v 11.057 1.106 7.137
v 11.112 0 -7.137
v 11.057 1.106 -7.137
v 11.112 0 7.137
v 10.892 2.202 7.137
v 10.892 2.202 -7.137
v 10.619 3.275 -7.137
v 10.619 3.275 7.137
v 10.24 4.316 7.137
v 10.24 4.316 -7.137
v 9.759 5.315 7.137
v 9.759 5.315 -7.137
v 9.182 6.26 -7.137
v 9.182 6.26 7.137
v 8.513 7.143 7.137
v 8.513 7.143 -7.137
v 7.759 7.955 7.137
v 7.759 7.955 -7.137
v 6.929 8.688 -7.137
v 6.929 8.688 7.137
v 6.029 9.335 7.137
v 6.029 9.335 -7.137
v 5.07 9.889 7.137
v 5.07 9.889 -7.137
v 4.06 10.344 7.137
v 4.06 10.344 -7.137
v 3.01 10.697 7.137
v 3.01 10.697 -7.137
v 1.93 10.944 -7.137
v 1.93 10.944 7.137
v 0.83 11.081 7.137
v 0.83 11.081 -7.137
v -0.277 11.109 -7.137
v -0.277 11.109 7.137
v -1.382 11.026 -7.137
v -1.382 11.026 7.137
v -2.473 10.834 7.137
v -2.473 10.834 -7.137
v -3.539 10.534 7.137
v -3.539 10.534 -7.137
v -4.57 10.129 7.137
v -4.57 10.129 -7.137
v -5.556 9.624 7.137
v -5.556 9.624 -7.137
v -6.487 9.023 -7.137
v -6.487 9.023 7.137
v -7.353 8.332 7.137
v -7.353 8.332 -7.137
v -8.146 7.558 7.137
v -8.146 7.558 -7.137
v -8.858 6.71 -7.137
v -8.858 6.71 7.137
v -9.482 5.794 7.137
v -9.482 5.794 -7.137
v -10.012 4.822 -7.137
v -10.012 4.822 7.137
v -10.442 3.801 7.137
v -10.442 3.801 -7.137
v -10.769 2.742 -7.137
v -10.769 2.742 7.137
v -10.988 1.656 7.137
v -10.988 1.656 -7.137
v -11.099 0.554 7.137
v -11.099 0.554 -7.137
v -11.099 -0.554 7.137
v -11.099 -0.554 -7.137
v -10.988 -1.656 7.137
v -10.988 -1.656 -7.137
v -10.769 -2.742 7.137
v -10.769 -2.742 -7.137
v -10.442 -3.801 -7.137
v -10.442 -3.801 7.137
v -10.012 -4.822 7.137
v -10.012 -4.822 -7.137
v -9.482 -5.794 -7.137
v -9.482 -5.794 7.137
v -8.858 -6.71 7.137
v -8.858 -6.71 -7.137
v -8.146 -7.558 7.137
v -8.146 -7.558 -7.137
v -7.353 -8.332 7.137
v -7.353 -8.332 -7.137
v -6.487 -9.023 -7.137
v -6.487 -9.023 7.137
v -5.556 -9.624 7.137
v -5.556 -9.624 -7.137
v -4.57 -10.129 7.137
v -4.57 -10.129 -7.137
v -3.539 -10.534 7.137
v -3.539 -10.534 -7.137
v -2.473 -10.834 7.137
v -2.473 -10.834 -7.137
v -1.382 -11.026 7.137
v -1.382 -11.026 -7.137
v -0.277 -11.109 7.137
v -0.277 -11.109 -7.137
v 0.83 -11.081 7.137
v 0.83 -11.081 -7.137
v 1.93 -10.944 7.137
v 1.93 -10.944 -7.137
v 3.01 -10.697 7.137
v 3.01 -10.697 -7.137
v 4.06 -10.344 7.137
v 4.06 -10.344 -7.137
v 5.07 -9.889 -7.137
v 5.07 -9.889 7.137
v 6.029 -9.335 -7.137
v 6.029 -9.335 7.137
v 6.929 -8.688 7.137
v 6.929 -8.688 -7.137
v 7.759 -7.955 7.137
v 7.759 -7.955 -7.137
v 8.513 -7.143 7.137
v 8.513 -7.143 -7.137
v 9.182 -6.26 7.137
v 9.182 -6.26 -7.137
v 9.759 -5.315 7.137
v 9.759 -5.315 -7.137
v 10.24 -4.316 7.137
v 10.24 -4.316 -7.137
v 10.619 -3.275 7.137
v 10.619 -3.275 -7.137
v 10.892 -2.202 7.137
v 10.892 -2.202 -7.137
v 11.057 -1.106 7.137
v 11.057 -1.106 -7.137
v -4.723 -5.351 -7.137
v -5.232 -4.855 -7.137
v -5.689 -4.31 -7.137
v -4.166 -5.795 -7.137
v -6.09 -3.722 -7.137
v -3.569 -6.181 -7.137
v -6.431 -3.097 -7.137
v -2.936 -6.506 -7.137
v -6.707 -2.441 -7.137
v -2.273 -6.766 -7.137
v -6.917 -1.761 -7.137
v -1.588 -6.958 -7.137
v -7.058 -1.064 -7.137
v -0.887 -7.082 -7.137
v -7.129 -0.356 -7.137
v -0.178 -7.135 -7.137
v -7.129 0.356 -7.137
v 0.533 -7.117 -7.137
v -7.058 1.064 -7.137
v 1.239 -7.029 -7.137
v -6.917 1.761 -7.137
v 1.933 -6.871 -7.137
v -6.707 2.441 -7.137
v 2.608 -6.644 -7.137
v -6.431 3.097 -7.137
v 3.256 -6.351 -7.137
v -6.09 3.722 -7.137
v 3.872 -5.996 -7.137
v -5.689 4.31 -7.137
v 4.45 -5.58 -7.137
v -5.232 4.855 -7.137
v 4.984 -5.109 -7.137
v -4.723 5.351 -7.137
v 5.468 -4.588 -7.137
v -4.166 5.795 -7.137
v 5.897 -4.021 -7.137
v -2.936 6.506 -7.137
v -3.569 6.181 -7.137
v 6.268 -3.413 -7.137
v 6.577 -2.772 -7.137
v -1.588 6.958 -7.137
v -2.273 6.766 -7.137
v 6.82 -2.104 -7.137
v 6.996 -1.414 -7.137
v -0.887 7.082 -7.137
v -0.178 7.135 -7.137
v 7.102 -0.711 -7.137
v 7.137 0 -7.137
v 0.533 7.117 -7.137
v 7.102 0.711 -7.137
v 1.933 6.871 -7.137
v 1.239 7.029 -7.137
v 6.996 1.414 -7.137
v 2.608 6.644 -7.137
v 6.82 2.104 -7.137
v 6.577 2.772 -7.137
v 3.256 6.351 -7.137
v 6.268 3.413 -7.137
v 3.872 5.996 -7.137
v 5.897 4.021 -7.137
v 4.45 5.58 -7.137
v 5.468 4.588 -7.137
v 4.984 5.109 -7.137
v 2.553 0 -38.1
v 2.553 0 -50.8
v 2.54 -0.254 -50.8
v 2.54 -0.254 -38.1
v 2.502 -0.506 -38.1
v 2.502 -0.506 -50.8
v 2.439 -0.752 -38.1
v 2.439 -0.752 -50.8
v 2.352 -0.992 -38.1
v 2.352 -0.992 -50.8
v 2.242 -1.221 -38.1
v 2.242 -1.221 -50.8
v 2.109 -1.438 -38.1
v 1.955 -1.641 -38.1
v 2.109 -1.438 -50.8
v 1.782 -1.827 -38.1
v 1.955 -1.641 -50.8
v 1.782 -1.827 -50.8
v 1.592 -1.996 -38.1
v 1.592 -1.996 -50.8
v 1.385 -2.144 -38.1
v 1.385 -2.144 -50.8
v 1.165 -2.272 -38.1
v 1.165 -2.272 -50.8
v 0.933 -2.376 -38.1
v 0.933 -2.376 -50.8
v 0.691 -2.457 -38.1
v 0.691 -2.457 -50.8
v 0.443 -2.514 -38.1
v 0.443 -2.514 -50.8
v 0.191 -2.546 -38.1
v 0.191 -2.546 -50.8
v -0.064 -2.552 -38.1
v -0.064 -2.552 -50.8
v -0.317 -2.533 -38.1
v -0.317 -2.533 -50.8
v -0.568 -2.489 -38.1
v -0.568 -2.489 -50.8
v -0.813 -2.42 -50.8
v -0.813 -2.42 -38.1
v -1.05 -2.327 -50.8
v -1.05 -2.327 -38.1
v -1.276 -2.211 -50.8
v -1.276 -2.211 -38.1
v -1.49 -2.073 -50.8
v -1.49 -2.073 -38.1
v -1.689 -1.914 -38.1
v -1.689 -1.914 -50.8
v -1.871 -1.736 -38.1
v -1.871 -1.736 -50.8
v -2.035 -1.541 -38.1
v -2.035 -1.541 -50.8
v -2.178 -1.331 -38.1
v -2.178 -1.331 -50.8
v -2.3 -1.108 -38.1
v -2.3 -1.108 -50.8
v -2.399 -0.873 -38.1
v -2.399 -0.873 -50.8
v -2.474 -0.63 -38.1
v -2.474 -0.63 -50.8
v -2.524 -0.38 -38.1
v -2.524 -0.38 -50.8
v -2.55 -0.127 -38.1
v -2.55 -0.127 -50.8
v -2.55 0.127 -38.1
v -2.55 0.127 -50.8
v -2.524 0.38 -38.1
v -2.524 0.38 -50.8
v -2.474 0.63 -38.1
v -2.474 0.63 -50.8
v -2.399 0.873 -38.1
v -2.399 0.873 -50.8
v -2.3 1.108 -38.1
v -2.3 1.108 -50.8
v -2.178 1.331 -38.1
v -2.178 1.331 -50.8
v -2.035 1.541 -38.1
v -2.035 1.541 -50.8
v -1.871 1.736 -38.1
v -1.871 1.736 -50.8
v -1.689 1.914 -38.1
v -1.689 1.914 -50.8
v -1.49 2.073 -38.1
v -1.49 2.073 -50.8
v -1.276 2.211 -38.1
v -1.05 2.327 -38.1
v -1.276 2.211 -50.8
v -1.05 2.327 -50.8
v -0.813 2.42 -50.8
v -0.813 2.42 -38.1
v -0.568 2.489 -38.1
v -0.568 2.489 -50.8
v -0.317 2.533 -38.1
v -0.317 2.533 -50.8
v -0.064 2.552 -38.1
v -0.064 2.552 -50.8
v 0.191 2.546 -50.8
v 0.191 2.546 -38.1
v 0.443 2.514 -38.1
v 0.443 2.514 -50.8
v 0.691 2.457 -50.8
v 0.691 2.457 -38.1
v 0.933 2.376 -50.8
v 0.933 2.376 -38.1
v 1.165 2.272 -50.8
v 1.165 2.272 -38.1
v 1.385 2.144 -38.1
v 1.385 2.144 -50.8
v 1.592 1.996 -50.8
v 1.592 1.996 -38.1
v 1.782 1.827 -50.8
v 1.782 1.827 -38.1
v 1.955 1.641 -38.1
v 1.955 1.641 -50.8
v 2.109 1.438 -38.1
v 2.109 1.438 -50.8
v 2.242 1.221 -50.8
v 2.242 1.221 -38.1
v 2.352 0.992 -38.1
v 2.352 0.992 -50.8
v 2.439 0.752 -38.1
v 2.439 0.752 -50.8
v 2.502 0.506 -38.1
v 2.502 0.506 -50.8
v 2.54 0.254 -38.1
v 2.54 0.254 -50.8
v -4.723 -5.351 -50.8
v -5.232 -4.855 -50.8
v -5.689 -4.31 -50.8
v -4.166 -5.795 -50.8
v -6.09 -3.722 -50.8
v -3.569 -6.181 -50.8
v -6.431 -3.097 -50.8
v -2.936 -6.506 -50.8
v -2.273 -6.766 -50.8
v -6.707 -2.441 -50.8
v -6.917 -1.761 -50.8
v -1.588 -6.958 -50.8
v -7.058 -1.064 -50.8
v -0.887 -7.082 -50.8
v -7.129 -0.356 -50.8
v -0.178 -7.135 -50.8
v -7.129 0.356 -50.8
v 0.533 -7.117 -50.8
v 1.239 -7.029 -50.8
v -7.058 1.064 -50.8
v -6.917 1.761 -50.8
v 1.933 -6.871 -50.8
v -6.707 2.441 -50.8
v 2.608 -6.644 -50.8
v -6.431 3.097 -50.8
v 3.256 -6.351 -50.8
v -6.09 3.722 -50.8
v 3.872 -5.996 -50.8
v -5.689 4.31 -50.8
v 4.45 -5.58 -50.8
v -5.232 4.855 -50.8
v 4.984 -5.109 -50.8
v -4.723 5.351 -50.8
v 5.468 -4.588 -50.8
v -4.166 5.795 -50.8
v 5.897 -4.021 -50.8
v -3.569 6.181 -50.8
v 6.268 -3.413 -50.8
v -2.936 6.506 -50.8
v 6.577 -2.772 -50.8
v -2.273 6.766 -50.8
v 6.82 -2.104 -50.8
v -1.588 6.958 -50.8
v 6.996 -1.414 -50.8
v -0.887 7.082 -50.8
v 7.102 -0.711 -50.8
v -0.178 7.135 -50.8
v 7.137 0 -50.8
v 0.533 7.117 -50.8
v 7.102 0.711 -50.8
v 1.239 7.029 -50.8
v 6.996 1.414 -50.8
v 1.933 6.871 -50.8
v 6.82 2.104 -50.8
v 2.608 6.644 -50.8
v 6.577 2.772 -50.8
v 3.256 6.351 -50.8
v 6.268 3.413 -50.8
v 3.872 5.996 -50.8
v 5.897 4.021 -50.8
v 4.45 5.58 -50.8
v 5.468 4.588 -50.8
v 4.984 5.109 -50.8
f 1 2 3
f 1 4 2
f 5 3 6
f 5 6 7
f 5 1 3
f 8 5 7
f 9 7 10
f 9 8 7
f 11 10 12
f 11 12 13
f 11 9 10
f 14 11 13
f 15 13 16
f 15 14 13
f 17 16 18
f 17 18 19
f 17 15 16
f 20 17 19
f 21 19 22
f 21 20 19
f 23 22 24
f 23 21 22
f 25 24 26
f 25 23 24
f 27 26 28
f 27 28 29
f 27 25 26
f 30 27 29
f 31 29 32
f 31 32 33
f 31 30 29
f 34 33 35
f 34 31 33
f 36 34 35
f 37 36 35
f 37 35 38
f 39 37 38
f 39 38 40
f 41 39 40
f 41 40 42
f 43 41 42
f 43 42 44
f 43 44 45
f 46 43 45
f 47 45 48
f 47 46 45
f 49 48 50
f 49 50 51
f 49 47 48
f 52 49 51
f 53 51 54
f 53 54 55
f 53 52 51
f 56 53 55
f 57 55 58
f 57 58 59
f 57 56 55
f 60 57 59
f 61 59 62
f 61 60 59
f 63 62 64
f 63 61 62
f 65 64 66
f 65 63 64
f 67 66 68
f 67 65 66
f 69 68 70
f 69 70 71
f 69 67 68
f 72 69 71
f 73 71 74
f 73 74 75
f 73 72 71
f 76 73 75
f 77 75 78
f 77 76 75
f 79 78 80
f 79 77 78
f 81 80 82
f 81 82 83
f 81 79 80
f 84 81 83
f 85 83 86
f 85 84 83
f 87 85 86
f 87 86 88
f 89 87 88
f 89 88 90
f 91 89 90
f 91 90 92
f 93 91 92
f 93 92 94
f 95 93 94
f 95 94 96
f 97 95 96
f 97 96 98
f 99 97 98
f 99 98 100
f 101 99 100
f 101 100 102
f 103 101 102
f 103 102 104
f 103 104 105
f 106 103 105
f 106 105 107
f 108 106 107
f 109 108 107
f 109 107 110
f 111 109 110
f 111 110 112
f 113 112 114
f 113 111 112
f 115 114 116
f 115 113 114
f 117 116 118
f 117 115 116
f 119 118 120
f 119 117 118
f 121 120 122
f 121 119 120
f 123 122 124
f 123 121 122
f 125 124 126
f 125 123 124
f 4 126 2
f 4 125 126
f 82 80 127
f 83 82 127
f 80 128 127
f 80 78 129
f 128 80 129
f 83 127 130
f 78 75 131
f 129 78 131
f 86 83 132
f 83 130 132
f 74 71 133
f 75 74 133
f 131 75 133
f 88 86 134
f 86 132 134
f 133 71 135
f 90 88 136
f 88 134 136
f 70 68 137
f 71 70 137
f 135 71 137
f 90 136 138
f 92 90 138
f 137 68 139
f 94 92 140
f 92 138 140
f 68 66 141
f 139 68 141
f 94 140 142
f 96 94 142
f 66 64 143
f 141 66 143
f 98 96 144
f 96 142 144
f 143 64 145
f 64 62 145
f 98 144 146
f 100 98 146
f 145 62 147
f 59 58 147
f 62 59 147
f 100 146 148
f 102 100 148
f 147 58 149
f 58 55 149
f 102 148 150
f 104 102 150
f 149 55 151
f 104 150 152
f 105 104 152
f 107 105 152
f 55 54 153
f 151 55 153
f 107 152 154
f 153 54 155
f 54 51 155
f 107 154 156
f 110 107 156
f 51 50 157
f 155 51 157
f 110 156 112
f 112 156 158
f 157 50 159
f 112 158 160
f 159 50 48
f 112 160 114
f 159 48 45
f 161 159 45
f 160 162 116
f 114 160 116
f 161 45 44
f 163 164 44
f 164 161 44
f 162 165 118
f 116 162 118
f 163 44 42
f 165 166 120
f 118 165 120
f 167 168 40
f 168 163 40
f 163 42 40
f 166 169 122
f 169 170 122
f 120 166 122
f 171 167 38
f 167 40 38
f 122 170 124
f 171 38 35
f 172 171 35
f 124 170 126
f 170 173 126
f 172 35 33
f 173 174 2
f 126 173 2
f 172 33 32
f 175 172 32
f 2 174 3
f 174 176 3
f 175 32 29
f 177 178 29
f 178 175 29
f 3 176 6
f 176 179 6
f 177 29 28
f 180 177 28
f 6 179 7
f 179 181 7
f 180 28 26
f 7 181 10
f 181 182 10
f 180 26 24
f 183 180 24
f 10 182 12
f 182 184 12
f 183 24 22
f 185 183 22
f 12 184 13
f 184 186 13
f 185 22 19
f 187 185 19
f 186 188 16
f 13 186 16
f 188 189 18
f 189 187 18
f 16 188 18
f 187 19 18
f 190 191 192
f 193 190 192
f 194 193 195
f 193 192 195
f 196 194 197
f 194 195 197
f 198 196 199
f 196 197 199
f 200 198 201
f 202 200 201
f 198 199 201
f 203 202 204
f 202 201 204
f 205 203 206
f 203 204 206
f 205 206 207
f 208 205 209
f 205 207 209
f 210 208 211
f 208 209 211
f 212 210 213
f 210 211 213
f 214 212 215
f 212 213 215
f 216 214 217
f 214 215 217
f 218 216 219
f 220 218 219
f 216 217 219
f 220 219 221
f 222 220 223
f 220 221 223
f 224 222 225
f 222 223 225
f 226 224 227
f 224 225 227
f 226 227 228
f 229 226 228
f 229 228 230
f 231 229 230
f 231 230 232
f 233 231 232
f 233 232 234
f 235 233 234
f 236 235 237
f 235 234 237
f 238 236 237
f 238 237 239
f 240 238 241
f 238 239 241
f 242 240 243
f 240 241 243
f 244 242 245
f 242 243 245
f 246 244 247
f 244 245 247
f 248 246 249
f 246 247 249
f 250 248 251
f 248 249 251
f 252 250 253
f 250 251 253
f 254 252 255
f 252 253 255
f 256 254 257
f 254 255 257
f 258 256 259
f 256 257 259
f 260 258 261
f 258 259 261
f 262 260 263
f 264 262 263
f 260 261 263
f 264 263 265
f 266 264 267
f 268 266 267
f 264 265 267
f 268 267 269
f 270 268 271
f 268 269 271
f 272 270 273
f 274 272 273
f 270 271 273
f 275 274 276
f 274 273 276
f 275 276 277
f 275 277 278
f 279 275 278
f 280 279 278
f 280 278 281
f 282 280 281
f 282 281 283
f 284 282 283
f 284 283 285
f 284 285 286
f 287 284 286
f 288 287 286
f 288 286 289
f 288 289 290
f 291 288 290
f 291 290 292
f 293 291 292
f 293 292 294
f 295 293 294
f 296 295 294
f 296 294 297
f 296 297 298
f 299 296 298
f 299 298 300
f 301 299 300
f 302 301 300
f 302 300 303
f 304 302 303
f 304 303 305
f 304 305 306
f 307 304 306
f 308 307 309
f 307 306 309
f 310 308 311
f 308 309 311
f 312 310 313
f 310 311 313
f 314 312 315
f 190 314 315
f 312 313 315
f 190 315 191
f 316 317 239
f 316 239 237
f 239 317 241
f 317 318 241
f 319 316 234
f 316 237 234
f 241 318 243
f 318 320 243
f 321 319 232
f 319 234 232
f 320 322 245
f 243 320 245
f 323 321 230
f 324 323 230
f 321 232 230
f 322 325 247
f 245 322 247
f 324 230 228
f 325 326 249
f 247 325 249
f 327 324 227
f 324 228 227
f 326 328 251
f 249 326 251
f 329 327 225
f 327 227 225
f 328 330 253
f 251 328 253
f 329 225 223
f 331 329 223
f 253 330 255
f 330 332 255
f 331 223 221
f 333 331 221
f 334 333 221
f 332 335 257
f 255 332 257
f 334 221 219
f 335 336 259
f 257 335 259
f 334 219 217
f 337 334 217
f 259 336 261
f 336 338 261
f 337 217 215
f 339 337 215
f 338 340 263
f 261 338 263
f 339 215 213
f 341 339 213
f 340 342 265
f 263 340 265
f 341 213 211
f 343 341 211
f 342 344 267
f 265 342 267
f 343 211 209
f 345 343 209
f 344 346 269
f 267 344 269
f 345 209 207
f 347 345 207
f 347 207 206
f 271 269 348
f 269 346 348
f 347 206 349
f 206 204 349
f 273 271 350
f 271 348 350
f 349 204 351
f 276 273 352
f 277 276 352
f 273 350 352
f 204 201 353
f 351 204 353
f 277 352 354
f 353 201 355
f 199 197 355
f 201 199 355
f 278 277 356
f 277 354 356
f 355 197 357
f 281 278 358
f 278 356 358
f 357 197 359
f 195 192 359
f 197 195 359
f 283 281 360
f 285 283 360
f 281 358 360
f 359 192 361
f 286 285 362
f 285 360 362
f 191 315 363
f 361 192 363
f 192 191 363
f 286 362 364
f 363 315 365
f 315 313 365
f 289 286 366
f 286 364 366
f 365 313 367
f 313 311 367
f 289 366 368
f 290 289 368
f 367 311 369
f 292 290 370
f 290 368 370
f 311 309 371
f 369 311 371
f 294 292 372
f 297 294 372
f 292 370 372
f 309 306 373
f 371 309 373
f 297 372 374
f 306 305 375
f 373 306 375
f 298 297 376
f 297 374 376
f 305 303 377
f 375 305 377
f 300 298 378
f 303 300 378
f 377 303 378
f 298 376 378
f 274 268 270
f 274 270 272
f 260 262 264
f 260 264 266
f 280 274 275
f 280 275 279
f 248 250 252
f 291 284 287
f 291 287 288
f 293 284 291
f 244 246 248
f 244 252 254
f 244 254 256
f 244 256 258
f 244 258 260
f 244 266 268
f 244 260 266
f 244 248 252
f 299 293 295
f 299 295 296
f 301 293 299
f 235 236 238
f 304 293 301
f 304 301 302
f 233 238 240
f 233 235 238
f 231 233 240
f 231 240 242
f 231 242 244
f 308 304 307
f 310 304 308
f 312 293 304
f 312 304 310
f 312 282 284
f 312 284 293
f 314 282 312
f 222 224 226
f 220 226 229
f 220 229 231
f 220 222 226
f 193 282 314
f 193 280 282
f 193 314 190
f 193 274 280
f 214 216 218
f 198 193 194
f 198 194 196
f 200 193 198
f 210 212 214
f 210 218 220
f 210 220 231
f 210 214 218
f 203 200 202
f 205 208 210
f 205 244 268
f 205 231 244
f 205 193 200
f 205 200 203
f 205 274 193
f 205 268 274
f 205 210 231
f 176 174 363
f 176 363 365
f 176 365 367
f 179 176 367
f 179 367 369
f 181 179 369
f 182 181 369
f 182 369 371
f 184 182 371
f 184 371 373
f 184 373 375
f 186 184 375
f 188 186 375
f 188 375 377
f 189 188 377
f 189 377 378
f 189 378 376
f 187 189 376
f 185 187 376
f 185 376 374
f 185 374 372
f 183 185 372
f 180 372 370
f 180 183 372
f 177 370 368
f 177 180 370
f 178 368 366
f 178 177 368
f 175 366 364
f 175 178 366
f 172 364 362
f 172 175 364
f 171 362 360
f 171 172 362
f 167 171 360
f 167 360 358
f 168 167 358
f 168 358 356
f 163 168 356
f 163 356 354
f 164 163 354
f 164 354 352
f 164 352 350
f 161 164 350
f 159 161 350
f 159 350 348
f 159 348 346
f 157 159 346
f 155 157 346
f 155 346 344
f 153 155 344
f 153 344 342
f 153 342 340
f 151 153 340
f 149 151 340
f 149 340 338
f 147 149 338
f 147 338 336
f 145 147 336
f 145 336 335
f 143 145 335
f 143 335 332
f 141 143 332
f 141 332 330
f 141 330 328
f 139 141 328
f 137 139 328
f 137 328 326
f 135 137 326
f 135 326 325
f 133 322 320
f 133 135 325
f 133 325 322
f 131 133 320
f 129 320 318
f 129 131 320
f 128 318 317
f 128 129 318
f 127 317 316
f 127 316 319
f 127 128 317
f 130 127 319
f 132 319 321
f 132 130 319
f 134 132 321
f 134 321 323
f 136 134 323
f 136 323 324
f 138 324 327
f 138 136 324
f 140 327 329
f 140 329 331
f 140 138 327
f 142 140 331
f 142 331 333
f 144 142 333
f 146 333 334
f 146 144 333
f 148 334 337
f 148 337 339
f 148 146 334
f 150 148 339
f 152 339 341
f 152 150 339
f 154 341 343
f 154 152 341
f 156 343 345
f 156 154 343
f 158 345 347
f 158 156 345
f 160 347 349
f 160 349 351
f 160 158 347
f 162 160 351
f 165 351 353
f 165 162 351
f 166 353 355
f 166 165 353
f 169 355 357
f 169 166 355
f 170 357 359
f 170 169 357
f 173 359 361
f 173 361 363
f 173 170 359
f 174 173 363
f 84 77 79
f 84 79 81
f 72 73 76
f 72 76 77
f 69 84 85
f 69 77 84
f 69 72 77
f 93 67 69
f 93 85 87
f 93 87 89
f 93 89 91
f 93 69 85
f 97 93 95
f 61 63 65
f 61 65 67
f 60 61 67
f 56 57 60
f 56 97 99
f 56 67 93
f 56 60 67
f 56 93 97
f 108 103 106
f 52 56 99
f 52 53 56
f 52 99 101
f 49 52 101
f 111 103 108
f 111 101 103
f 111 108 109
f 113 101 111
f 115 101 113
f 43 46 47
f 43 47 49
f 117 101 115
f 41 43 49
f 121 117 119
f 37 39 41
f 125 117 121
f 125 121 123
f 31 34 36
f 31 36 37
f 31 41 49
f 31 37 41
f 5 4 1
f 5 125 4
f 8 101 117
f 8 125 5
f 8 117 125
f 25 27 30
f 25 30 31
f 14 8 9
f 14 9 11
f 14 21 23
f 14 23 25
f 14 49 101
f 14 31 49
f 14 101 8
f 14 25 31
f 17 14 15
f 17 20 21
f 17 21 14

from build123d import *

# Parameters (mm, degrees)
F0_R     = 11.1125
F1_DEPTH = 7.1374
F2_R     = 7.1374
F3_DEPTH = 50.8
F4_R     = 2.5527
F5_DEPTH = 12.7


with BuildPart() as f1:
    # F0 (on Top) → F1 (new body, symmetric)
    with BuildSketch(Plane.XY):
        Circle(F0_R)
    extrude(amount=F1_DEPTH, both=True)

    # F2 (on Top) → F3 (join)
    with BuildSketch(Plane.XY):
        Circle(F2_R)
    extrude(amount=-F3_DEPTH)

    # F4 (on face) → F5 (cut)
    with BuildSketch(Plane(origin=(0, 0, -50.8), x_dir=(1, 0, 0), z_dir=(0, 0, -1))):
        Circle(F4_R)
    extrude(amount=-F5_DEPTH, mode=Mode.SUBTRACT)


solid = f1.part
